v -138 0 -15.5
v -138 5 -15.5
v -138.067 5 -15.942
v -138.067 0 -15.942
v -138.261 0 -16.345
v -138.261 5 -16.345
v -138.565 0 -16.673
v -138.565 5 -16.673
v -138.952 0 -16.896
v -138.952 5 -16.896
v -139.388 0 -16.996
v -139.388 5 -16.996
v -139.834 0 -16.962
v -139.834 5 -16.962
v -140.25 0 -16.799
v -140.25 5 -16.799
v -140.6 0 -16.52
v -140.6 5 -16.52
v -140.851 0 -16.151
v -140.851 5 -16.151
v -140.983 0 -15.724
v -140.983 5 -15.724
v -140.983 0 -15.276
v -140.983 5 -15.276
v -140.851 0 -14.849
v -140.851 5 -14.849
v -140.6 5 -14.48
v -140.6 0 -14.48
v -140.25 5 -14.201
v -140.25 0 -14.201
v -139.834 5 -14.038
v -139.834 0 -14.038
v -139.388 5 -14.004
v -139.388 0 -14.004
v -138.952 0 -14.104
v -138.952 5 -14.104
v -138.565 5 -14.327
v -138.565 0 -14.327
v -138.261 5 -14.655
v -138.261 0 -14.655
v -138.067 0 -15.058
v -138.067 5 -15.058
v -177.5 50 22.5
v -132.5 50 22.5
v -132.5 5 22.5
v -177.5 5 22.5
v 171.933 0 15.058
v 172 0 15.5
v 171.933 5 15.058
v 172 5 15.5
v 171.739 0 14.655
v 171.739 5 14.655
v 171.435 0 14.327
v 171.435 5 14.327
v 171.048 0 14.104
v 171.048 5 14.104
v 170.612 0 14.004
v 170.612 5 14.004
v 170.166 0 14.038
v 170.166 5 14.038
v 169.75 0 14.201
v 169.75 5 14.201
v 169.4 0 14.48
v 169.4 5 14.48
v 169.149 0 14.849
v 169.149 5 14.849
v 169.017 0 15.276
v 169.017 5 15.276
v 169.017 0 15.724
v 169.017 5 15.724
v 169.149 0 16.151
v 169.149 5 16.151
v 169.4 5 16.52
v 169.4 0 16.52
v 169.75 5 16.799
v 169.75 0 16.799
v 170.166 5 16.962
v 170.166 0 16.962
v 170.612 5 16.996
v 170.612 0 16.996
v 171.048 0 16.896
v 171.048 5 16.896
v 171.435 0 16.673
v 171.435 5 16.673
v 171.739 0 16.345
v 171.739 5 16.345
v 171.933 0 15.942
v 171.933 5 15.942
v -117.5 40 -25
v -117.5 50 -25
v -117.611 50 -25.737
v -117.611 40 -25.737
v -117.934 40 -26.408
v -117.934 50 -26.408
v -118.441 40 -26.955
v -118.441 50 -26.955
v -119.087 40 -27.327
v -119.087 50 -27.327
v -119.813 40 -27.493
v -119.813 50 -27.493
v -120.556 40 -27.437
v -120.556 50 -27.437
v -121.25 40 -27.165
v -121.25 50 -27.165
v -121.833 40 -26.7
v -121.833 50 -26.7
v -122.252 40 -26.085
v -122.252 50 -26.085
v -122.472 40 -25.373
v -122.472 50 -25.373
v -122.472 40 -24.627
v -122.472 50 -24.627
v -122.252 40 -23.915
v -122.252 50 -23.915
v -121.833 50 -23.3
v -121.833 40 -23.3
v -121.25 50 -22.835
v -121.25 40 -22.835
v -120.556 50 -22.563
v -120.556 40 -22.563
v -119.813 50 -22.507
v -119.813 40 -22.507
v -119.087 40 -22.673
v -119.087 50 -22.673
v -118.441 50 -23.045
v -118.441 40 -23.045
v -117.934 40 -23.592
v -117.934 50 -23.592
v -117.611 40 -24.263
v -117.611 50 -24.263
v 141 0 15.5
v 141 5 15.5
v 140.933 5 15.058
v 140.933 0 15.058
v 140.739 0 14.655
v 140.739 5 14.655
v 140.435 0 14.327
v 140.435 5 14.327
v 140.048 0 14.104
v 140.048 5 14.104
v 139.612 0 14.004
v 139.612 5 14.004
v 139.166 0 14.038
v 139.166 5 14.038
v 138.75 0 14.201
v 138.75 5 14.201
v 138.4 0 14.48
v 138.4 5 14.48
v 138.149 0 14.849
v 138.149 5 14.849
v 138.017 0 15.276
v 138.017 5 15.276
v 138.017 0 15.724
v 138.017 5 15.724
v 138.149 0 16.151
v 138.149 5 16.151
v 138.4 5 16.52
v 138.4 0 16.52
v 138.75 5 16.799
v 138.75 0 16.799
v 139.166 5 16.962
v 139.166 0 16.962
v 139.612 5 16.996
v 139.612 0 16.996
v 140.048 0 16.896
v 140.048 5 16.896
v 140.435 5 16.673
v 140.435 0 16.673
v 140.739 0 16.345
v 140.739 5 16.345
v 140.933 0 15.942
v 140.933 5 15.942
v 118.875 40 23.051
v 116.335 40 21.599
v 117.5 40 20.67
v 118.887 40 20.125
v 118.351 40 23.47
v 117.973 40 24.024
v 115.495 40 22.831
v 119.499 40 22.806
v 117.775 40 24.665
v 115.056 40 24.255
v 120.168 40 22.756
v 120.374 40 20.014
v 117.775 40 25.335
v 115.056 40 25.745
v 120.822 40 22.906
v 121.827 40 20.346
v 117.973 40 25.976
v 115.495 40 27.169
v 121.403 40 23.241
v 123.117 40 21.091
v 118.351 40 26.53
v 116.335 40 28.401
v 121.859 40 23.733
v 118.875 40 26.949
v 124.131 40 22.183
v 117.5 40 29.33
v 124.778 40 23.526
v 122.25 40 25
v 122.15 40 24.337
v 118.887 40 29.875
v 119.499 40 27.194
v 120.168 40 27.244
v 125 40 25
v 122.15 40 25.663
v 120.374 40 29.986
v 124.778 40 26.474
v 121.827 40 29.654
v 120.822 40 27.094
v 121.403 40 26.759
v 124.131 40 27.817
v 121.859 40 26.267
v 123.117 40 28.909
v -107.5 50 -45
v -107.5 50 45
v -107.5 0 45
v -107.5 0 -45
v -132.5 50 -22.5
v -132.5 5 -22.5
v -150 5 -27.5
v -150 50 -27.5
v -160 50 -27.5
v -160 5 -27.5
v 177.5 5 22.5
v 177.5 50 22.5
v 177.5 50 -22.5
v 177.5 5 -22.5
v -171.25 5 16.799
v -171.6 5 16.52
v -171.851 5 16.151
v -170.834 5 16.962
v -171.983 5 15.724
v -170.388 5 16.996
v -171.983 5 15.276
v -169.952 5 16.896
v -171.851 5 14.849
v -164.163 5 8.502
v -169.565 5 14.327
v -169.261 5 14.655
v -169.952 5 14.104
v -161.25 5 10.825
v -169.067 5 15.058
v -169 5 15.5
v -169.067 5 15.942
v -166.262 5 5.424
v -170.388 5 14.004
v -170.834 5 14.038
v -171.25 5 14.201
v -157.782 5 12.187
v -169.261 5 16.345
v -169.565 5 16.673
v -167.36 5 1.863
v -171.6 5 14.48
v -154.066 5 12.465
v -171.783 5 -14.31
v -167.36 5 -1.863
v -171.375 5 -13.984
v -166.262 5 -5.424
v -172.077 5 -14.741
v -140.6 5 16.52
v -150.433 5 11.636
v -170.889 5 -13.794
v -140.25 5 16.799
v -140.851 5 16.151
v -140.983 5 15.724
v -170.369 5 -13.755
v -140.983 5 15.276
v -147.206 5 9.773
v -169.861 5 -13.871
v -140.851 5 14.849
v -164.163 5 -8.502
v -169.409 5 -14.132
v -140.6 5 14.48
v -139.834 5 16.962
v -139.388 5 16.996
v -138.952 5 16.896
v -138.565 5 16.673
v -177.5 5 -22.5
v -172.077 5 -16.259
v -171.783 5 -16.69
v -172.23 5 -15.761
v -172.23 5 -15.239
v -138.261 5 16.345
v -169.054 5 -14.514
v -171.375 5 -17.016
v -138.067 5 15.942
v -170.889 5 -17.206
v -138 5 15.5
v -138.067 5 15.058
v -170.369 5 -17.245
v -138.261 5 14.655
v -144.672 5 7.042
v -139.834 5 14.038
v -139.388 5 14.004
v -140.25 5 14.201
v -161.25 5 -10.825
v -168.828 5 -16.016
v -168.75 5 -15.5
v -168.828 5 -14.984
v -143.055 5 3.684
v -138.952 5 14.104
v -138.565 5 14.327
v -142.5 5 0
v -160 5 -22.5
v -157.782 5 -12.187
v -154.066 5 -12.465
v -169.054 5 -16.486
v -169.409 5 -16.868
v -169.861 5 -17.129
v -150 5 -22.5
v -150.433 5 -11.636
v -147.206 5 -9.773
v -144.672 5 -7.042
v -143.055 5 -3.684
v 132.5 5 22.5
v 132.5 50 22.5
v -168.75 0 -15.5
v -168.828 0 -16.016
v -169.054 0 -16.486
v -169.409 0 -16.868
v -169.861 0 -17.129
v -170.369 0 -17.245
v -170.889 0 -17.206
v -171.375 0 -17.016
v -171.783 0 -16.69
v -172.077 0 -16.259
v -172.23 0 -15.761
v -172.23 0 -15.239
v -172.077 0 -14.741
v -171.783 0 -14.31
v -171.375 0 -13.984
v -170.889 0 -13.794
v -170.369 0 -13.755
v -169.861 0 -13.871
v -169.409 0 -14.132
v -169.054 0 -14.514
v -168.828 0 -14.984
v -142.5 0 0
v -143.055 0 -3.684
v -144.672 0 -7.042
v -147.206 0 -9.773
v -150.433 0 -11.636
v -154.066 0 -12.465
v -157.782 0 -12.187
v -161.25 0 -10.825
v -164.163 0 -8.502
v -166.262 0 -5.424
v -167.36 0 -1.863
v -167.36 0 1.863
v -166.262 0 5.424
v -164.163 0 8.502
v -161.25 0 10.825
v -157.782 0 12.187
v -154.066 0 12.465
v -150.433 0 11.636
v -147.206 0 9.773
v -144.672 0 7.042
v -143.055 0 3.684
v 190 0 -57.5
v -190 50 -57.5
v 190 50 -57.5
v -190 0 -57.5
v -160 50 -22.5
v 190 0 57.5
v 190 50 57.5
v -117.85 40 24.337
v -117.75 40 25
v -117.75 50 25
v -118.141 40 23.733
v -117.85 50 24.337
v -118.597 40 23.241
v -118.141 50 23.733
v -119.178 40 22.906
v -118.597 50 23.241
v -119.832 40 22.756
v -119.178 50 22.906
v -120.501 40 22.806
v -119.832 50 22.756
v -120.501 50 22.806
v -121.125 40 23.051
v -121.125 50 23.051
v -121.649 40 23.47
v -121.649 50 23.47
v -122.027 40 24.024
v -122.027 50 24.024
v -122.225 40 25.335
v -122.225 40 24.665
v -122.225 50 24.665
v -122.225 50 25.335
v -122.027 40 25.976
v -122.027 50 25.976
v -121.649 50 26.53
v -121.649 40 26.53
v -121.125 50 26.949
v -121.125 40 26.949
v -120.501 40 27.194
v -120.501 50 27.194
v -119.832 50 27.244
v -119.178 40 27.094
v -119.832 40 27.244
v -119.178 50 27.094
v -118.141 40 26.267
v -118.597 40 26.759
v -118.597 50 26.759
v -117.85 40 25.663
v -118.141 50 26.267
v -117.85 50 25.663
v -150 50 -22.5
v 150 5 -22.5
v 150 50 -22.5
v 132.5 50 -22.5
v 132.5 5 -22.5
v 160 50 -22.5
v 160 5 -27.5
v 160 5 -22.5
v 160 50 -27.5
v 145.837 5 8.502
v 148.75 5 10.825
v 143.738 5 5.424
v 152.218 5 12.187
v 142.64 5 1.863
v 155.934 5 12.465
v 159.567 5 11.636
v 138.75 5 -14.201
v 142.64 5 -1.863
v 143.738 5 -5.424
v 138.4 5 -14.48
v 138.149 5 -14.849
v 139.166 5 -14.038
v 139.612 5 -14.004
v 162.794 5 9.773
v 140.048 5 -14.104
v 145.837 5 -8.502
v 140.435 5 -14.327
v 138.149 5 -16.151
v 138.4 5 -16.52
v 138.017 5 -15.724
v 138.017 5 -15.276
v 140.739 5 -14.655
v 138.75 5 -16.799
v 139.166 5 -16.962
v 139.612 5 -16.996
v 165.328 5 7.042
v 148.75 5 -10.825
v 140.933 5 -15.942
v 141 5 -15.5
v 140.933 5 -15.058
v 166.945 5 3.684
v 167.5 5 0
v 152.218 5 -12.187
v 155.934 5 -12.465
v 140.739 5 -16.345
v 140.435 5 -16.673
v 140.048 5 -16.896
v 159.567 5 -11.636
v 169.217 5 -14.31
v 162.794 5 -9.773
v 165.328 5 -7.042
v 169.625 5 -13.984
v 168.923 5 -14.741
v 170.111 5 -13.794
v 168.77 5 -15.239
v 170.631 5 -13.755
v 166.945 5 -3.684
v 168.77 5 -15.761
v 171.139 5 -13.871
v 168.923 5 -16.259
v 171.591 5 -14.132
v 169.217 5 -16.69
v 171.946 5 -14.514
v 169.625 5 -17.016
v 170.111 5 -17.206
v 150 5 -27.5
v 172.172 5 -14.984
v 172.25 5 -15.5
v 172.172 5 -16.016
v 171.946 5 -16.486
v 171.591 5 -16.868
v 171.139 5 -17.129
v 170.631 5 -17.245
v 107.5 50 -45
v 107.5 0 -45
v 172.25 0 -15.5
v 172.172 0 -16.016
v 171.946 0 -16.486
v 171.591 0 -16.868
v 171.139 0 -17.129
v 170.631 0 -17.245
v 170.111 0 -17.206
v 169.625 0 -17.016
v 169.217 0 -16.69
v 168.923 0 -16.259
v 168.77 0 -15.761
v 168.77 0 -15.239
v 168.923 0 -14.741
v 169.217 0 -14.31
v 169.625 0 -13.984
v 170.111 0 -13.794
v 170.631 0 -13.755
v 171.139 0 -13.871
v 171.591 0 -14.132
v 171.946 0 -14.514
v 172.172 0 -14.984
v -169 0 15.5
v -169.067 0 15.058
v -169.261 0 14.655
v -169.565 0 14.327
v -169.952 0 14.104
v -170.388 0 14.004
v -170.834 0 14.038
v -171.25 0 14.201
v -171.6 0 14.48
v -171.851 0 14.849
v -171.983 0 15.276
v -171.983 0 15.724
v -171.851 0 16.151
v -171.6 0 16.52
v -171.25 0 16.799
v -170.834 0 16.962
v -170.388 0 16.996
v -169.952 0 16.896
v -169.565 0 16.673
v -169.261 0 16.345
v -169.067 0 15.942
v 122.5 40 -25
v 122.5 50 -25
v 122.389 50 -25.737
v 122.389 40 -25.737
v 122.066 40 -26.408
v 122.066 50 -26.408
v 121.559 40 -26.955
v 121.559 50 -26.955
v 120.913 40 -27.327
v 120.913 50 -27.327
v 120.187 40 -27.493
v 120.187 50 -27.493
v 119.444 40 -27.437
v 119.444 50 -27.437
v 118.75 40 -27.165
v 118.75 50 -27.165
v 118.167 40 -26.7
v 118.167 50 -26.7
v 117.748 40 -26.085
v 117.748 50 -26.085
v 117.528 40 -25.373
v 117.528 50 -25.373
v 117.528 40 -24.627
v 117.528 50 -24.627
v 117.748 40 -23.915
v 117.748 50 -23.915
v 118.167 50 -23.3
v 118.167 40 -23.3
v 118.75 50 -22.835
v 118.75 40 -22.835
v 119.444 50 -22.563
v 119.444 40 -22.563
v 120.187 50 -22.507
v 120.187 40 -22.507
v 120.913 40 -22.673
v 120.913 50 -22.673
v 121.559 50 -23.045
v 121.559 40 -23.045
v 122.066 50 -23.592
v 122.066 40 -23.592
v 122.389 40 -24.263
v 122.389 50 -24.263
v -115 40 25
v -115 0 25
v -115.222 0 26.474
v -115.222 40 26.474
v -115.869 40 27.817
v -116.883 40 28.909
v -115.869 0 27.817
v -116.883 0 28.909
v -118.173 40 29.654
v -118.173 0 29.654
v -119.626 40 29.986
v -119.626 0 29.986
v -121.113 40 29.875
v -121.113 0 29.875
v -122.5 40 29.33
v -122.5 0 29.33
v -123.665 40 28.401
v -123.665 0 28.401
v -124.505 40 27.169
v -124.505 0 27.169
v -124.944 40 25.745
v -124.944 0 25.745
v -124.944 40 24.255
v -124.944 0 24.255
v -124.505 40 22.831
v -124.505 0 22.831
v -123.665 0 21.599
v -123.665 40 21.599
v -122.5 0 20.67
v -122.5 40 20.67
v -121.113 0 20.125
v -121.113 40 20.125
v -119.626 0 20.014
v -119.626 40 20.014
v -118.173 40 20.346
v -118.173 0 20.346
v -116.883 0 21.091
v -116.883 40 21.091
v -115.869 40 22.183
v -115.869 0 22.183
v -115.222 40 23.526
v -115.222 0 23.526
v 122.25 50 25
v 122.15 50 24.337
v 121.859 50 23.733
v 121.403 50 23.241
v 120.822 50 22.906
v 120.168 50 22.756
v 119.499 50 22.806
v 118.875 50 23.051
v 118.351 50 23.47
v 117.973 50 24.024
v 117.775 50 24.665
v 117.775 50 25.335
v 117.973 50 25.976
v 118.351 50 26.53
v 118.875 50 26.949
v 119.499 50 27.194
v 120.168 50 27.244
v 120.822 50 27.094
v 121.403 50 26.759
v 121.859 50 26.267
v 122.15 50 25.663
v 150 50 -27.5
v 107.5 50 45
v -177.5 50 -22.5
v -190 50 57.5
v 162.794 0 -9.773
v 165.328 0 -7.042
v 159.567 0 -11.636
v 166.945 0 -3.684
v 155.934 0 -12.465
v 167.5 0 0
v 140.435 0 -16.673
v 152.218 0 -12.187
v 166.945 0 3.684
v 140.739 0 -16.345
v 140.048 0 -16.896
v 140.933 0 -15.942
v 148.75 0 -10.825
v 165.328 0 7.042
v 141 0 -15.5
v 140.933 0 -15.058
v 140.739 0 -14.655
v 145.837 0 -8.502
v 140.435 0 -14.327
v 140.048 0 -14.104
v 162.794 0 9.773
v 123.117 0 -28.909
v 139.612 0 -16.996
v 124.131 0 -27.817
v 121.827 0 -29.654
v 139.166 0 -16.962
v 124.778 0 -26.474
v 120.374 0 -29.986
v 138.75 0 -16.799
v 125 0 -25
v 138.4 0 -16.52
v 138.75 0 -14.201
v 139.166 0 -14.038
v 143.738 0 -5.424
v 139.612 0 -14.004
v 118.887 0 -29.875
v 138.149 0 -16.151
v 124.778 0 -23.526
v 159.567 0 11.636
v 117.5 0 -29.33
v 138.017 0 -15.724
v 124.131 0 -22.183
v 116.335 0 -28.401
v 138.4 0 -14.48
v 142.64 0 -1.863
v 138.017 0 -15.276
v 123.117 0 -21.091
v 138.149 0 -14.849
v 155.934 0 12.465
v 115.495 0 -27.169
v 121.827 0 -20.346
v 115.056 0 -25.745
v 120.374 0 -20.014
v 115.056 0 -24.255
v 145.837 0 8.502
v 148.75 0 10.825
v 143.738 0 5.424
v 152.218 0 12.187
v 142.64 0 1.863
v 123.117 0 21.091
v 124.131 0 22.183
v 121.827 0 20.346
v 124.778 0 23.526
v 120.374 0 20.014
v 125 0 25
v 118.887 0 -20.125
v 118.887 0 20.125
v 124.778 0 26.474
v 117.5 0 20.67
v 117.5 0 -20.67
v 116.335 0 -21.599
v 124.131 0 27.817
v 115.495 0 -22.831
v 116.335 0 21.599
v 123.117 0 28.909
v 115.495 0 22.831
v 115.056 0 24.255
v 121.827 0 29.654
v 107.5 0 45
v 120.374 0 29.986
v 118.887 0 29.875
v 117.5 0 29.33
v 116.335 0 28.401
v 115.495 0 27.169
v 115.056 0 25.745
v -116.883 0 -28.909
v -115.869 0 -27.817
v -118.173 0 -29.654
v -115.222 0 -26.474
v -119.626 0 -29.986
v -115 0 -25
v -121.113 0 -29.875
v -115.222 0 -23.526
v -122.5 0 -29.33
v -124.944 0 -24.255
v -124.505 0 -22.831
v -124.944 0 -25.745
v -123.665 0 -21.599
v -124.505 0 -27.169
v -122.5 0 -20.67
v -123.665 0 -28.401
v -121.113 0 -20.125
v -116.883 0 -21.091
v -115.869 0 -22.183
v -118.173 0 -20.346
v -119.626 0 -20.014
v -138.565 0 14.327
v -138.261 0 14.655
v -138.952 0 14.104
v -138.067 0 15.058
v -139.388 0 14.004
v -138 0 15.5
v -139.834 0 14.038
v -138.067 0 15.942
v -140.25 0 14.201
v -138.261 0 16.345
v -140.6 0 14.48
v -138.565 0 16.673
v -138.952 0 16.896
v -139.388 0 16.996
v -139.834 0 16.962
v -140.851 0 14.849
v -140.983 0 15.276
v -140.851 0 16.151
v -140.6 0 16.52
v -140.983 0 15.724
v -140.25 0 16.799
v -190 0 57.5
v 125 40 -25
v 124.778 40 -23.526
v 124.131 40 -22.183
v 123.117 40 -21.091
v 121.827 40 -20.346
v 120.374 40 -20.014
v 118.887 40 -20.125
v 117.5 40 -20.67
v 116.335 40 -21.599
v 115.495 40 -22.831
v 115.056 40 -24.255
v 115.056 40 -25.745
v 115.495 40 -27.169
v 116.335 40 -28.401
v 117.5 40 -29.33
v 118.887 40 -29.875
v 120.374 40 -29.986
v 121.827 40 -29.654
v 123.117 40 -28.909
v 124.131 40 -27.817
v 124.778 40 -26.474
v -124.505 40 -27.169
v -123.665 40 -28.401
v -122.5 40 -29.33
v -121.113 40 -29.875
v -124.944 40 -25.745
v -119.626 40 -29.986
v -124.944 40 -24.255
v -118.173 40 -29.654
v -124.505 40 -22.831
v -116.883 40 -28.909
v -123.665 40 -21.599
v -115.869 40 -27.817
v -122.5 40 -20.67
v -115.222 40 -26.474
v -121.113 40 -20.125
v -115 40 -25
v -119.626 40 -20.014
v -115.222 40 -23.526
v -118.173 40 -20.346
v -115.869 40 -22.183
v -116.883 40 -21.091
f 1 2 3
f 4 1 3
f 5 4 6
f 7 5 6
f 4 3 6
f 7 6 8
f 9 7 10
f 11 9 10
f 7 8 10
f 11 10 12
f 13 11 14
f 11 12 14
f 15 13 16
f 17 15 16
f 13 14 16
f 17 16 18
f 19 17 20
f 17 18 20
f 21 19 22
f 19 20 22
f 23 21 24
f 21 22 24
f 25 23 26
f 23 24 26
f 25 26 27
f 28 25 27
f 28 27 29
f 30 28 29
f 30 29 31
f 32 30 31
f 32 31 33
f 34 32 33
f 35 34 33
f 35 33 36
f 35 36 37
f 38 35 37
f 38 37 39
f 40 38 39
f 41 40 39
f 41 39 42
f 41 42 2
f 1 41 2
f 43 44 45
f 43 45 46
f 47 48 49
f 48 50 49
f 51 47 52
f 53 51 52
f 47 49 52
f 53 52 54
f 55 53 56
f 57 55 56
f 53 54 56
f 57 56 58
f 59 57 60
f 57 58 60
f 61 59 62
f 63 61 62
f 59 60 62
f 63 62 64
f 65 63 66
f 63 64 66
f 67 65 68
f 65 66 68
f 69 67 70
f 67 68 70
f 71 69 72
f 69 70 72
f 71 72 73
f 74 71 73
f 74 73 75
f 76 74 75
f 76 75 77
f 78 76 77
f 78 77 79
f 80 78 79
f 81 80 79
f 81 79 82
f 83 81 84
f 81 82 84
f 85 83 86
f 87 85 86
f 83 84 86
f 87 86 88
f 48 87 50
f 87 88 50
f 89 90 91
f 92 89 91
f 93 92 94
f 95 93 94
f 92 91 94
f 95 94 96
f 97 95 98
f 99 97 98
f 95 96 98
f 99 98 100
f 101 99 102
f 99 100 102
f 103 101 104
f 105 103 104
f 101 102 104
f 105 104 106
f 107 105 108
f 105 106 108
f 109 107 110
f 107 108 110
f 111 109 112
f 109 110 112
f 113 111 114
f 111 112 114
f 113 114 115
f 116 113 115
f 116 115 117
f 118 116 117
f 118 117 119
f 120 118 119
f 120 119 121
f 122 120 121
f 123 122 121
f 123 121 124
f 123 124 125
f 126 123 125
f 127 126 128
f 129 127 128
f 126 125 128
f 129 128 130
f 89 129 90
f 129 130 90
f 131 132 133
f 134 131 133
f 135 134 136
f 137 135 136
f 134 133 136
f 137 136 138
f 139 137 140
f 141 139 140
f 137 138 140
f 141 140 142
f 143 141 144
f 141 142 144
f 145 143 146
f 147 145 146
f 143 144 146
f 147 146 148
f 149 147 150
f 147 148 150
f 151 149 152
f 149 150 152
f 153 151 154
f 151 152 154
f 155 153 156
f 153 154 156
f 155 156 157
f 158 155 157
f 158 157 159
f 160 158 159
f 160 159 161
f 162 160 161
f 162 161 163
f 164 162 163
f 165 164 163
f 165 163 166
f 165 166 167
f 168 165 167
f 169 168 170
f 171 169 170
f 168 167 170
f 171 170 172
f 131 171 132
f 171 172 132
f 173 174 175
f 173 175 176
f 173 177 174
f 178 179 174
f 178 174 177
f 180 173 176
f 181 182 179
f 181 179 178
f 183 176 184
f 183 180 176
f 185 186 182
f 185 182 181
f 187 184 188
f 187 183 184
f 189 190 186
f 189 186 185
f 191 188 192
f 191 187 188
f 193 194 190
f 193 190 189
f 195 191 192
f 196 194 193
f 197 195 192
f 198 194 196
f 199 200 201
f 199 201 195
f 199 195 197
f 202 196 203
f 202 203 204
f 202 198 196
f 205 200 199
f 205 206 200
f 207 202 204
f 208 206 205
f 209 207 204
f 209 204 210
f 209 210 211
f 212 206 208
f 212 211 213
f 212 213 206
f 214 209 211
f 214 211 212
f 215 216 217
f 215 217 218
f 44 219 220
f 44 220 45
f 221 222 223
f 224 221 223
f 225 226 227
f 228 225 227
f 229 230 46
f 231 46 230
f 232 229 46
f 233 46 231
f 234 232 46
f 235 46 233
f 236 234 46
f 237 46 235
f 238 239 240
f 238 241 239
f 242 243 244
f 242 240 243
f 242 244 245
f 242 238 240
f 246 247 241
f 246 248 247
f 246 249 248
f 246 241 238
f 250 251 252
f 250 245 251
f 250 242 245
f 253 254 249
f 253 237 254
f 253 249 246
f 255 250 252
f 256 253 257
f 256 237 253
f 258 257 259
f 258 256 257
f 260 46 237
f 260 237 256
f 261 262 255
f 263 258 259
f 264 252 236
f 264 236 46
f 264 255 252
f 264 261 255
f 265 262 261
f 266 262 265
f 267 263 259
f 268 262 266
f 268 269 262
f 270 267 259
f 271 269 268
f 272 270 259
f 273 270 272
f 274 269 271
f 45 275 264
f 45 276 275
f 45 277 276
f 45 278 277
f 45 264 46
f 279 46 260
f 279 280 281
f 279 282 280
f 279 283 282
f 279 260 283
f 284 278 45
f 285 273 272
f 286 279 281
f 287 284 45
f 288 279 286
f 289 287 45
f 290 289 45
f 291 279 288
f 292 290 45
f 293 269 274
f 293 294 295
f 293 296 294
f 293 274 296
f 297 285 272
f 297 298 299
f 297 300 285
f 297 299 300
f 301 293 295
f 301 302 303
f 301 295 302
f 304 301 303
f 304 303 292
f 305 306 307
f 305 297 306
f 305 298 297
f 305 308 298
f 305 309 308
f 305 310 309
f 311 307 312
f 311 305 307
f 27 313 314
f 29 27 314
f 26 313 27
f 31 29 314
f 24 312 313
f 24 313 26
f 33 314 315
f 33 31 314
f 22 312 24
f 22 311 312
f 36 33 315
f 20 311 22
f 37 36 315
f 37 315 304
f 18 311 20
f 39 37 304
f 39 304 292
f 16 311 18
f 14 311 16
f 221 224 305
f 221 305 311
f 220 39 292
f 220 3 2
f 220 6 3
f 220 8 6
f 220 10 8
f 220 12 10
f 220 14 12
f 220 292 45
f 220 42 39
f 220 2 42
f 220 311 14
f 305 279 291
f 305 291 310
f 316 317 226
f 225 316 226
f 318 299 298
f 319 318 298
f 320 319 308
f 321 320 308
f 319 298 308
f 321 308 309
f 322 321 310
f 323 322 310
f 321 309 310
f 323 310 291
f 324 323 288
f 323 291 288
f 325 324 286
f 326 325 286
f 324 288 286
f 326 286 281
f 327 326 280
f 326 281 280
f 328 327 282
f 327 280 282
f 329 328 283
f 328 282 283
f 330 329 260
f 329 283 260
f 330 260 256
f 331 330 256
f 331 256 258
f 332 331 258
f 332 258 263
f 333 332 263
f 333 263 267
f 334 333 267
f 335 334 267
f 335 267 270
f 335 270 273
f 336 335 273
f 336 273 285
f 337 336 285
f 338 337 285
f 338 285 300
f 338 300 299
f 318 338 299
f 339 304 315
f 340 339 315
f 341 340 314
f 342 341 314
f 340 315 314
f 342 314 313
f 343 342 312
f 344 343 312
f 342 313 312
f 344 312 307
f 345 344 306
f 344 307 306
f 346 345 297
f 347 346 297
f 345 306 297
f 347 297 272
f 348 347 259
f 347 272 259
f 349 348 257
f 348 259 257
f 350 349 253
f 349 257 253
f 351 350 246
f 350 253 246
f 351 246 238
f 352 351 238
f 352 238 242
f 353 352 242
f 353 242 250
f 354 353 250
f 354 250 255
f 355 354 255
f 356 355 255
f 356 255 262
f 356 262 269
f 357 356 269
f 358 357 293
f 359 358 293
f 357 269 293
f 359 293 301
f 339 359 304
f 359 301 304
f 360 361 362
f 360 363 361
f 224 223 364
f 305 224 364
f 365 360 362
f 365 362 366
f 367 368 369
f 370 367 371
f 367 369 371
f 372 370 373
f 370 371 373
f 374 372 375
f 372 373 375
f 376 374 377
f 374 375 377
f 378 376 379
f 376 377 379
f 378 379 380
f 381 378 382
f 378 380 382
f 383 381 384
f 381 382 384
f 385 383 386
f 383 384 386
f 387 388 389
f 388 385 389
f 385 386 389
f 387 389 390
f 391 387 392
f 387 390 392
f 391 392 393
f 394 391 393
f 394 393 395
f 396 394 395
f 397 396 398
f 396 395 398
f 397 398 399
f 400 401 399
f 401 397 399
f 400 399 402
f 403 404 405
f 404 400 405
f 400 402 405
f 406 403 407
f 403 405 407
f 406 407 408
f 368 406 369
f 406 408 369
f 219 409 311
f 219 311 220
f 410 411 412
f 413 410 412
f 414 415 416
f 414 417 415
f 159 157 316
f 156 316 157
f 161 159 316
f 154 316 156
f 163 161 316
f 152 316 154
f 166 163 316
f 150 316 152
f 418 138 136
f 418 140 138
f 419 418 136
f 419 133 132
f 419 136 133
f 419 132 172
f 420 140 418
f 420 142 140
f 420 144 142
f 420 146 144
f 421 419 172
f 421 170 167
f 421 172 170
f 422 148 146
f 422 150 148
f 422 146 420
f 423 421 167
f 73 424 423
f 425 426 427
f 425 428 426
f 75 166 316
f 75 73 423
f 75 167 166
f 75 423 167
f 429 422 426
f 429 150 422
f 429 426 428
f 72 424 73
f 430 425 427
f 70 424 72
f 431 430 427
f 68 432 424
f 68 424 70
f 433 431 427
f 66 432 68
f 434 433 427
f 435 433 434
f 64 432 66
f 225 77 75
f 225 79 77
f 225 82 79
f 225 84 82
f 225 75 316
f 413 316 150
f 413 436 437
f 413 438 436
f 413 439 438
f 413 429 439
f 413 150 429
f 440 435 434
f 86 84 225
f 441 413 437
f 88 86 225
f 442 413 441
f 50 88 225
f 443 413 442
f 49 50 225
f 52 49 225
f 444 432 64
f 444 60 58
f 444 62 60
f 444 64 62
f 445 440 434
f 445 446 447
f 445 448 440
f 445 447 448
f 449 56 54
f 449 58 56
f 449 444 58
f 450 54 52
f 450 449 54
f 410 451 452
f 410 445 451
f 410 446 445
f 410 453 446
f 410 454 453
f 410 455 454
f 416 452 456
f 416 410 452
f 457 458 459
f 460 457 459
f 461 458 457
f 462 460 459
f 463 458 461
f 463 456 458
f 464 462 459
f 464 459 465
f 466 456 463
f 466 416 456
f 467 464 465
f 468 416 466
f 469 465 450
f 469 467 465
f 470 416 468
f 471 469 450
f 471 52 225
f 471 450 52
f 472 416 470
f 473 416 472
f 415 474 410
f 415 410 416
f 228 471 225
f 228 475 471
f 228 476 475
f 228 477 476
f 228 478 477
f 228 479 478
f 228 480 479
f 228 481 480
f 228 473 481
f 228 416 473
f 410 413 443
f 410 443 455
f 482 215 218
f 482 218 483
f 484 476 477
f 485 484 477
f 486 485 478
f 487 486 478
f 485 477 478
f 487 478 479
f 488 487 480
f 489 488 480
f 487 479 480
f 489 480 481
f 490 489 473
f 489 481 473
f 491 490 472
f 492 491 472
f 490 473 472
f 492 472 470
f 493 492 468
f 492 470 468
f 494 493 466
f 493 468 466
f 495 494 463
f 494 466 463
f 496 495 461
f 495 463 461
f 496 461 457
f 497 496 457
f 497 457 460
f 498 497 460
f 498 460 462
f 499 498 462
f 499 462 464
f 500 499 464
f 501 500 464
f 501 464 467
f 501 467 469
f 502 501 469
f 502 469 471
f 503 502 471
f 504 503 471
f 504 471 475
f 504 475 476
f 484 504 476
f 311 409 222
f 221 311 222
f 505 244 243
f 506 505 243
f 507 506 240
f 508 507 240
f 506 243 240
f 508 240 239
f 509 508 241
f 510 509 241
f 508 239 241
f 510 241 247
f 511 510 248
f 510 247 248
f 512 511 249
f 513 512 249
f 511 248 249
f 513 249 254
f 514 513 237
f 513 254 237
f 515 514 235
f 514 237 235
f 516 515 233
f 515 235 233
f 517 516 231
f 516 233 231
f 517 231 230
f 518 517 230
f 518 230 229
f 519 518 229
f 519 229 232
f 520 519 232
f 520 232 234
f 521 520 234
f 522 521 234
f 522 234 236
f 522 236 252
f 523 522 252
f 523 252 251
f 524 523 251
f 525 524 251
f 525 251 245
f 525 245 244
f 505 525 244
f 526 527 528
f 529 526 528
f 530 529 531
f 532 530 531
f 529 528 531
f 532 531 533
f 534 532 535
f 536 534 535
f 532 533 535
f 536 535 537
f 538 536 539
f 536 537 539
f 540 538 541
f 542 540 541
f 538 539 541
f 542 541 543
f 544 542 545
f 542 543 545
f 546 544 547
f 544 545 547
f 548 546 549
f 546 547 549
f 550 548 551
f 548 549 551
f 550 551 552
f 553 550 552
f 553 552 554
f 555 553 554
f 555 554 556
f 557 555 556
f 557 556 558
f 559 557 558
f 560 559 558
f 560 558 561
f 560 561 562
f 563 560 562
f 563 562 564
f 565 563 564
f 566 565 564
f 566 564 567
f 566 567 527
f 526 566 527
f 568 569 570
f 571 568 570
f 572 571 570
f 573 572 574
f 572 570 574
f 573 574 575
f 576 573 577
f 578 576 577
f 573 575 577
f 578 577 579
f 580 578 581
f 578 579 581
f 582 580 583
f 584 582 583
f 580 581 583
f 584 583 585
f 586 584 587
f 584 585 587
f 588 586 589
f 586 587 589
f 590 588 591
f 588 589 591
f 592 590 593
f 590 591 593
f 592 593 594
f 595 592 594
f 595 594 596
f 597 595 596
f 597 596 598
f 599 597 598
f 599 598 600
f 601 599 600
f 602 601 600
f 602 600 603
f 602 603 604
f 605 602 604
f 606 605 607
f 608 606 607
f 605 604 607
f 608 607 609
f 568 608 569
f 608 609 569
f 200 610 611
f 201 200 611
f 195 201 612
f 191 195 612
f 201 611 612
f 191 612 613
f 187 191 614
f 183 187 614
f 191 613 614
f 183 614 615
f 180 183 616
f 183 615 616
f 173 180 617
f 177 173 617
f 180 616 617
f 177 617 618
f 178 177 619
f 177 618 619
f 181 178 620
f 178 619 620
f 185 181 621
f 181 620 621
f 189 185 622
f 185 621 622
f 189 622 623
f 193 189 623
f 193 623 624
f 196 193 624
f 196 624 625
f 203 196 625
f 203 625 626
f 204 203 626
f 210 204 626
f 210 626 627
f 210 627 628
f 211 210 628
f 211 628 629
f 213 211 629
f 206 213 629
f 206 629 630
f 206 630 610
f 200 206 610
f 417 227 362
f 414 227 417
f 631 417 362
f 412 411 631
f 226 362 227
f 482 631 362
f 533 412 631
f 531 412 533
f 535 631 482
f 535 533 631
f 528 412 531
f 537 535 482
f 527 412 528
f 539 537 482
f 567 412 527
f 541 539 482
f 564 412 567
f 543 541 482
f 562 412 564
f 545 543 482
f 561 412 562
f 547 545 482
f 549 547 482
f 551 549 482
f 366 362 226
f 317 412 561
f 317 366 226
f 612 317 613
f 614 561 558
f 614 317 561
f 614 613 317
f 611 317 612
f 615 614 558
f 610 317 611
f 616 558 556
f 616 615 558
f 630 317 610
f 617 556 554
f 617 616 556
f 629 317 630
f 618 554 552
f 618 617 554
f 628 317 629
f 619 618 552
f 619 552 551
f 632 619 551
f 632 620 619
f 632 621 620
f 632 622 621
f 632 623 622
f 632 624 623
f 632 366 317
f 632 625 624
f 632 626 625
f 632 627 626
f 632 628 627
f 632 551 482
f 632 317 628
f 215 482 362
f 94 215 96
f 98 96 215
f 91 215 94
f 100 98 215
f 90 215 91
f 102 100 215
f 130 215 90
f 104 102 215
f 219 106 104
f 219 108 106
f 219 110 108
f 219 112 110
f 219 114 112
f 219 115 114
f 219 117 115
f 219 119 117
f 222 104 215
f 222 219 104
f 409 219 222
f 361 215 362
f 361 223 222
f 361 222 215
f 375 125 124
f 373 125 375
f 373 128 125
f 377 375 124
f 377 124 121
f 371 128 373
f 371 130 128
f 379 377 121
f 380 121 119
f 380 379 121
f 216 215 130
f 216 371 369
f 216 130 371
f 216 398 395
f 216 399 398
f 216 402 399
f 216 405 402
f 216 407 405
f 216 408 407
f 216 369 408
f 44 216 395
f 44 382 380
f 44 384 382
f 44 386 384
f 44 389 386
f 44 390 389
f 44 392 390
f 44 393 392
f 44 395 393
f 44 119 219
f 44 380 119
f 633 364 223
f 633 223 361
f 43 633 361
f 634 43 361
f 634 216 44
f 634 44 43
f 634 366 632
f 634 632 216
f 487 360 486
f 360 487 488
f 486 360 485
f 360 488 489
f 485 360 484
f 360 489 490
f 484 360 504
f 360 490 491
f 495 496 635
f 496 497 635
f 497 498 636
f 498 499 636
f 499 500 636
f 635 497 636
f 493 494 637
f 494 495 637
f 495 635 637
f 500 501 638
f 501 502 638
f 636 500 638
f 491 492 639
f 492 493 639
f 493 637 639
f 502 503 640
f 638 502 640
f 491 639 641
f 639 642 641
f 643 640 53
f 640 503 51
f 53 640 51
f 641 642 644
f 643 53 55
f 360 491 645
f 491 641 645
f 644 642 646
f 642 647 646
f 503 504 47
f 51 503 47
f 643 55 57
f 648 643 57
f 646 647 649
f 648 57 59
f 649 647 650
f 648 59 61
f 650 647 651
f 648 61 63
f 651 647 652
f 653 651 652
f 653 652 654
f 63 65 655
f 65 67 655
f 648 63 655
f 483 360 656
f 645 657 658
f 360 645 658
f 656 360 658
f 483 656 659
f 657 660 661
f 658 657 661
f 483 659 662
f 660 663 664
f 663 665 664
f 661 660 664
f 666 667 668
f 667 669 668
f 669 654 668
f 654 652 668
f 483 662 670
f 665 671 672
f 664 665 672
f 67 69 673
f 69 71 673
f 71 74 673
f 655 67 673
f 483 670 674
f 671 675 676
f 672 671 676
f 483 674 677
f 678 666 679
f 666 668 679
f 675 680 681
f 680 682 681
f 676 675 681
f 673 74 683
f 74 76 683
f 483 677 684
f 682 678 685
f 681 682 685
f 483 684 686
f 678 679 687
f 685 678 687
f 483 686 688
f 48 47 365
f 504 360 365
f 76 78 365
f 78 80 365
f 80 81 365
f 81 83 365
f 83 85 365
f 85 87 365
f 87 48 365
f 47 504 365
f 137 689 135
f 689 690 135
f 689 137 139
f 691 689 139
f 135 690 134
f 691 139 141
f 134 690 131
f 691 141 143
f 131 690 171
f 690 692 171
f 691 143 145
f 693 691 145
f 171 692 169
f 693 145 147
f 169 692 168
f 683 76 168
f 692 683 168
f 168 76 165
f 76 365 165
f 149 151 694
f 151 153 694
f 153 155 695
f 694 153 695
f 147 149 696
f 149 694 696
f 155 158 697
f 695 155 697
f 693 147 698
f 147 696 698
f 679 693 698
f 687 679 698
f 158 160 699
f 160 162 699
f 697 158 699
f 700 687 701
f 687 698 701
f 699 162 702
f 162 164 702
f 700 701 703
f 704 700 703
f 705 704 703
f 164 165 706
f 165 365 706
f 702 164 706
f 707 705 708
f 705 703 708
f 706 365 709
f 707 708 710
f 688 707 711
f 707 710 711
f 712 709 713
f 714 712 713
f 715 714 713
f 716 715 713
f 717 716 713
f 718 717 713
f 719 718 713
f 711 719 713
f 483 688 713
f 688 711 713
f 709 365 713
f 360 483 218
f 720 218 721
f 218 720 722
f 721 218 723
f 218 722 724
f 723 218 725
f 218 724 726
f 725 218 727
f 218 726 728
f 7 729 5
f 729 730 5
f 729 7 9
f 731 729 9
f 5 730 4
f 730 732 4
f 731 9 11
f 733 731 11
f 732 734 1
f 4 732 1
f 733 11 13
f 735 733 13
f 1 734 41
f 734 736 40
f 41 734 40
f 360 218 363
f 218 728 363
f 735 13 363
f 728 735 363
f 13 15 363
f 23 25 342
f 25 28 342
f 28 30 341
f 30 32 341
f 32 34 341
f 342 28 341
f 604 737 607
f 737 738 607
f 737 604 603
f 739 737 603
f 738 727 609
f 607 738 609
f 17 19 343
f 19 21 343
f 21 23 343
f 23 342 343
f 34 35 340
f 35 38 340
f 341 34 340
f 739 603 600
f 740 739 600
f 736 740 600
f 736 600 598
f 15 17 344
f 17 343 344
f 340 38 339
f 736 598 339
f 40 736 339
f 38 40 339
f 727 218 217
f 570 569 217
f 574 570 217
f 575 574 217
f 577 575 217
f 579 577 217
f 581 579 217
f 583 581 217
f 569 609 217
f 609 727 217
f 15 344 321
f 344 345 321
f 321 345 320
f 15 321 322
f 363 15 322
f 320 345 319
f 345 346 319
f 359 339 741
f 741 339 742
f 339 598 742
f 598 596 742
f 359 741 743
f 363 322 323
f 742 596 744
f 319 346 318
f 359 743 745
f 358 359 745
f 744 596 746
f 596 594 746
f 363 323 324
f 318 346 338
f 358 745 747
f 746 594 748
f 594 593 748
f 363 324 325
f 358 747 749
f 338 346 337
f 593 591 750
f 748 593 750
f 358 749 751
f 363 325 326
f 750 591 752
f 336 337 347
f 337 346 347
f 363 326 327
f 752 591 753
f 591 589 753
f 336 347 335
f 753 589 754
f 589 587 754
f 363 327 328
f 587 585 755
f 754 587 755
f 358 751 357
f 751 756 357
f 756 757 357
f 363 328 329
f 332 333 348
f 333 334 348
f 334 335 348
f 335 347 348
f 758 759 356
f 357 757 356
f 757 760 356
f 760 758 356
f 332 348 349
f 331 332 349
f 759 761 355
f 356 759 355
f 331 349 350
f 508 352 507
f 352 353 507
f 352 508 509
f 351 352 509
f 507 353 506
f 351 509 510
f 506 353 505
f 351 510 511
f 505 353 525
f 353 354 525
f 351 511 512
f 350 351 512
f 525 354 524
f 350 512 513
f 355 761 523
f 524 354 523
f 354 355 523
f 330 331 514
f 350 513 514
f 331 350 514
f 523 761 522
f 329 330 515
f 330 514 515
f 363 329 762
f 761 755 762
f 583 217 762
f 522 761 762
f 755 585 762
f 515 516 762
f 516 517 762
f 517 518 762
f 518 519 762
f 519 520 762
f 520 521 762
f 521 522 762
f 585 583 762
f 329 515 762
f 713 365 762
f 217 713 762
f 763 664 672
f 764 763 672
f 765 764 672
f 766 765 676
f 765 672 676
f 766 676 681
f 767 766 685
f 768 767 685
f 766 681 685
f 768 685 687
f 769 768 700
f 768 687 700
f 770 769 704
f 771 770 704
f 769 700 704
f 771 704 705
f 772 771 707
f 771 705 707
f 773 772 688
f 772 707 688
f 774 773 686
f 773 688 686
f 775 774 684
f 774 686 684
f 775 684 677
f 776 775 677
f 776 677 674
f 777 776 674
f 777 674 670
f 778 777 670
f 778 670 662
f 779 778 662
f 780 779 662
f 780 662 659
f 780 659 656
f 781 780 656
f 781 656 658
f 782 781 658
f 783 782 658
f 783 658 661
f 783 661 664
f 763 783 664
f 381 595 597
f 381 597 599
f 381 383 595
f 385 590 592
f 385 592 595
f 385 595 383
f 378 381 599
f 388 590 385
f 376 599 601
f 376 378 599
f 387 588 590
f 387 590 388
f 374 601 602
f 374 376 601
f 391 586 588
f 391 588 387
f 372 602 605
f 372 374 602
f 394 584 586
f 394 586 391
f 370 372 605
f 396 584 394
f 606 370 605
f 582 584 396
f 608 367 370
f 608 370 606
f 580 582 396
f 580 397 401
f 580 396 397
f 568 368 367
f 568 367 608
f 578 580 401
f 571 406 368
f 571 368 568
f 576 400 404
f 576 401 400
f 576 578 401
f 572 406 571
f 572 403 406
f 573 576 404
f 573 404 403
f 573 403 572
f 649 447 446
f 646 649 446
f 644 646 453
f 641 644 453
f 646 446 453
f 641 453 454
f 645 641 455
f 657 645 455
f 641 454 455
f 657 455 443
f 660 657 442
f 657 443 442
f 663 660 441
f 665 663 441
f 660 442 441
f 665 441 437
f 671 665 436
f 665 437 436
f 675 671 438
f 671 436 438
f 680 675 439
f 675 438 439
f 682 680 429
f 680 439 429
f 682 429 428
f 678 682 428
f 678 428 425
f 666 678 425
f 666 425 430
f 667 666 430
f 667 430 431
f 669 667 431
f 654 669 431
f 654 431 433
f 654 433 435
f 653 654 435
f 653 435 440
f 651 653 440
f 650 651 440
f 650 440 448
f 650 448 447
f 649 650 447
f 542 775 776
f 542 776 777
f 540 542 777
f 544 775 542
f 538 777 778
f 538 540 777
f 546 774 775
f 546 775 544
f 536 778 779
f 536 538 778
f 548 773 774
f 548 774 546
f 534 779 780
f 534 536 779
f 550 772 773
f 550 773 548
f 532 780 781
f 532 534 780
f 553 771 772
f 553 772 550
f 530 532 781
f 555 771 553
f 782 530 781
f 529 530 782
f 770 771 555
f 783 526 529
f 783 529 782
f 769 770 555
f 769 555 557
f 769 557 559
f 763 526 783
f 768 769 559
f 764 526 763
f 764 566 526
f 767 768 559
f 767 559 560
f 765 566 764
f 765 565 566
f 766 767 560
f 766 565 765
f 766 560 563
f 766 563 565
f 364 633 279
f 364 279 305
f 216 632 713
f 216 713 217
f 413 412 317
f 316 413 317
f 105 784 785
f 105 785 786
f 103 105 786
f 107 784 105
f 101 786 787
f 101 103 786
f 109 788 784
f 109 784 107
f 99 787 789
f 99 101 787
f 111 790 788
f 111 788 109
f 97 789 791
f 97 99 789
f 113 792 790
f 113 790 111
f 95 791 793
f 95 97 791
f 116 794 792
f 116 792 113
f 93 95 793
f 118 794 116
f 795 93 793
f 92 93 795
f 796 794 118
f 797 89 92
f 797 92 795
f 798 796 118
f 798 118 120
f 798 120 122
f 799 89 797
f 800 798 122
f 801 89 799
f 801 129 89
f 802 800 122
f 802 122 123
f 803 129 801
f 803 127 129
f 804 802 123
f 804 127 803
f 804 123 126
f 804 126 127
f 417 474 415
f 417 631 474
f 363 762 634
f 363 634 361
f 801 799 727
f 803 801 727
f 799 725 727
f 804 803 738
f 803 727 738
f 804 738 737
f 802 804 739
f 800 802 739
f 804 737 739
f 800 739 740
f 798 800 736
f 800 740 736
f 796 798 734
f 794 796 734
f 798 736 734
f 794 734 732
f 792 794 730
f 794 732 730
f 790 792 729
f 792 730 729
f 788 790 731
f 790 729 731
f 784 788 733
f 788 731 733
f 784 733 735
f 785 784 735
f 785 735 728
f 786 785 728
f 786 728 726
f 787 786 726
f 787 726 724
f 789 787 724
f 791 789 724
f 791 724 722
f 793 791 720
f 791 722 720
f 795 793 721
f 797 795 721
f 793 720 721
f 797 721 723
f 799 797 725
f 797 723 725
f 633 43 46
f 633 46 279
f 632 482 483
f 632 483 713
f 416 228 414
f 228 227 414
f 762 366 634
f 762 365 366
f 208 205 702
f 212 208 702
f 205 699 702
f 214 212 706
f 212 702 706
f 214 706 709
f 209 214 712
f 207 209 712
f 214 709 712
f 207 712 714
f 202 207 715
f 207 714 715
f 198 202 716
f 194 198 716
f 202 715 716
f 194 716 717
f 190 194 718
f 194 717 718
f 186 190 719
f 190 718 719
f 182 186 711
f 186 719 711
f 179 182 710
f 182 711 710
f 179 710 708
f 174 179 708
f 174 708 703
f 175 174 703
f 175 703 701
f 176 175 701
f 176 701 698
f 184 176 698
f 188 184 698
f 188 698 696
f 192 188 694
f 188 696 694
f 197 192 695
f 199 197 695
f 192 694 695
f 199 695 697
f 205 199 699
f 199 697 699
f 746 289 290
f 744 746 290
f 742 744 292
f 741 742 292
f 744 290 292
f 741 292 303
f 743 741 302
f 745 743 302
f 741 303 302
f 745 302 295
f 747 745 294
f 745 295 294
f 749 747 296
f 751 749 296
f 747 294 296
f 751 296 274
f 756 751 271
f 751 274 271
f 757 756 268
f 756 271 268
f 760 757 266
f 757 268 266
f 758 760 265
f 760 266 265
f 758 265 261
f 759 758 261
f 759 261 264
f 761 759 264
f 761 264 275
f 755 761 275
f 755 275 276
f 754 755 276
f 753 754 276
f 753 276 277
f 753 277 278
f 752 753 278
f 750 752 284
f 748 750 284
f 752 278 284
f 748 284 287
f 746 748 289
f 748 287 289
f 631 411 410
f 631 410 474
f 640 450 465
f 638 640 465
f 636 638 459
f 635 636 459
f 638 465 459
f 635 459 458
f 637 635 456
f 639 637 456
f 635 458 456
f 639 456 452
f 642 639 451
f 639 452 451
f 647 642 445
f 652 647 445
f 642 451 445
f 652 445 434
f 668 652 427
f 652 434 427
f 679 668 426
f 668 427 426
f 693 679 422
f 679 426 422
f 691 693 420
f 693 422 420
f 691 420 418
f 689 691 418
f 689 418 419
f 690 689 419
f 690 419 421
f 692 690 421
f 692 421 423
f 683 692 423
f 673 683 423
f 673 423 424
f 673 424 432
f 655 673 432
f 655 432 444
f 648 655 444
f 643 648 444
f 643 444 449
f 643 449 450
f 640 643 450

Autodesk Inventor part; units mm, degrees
ref_plane "YZ Plane" through (0, 0, 0) normal (1, 0, 0) x (0, 1, 0)
ref_plane "XZ Plane" through (0, 0, 0) normal (0, 1, 0) x (-1, 0, 0)
ref_plane "XY Plane" through (0, 0, 0) normal (0, 0, 1) x (1, 0, 0)
sketch "Sketch1" plane through (0, 0, 0) normal (0, 1, 0) x (-1, 0, 0)
  line L0 (190, -57.5) -> (-190, -57.5)
  line L1 (-190, -57.5) -> (-190, 57.5)
  line L2 (-190, 57.5) -> (190, 57.5)
  line L3 (190, 57.5) -> (190, -57.5)
  line L4 (0, -57.5) -> (0, 57.5) construction
  line L5 (190, 0) -> (-190, 0) construction
  point P0 (0, 0)
  point P1 (0, 0)
  dimension "d0" = 380
  dimension "d1" = 115
extrude "Extrusion1" add sketch "Sketch1" along normal blind 50
sketch "Sketch2" plane through (0, 50, 0) normal (0, 1, 0) x (1, 0, 0)
  line L0 (-177.5, 22.5) -> (-132.5, 22.5)
  line L1 (-132.5, 22.5) -> (-132.5, -22.5)
  line L2 (-132.5, -22.5) -> (-177.5, -22.5)
  line L3 (-177.5, -22.5) -> (-177.5, 22.5)
  line L4 (190, 57.5) -> (-190, 57.5) construction
  line L5 (0, 57.5) -> (0, -57.5) construction
  line L6 (-190, -57.5) -> (190, -57.5) construction
  line L7 (-190, 57.5) -> (-190, -57.5) construction
  line L8 (-190, 0) -> (190, 0) construction
  line L9 (190, -57.5) -> (190, 57.5) construction
  line L10 (-177.5, 0) -> (-132.5, 0) construction
  line L11 (-155, 22.5) -> (-155, -22.5) construction
  line L12 (177.5, 22.5) -> (132.5, 22.5)
  line L13 (132.5, 22.5) -> (132.5, -22.5)
  line L14 (132.5, -22.5) -> (177.5, -22.5)
  line L15 (177.5, -22.5) -> (177.5, 22.5)
  point P0 (0, 0)
  dimension "d4" = 45
  dimension "d5" = 45
  dimension "d6" = 310
extrude "Extrusion2" cut sketch "Sketch2" against normal blind 45
sketch "Sketch3" plane through (0, 50, 0) normal (0, 1, 0) x (1, 0, 0)
  line L0 (190, 57.5) -> (-190, 57.5) construction
  line L1 (0, 57.5) -> (0, -57.5) construction
  line L2 (-190, -57.5) -> (190, -57.5) construction
  line L3 (-132.5, 22.5) -> (-132.5, -22.5) construction
  line L4 (-132.5, 0) -> (132.5, 0) construction
  line L5 (132.5, -22.5) -> (132.5, 22.5) construction
  line L6 (-120, 25) -> (-120, -25) construction
  circle A0 centre (-120, 25) radius 2.5
  circle A1 centre (-120, -25) radius 2.25
  circle A2 centre (120, 25) radius 2.5
  circle A3 centre (120, -25) radius 2.25
  point P0 (0, 0)
  dimension "d15" = 50
  dimension "d16" = 5
  dimension "d17" = 4.5
  dimension "d18" = 50
  dimension "d19" = 240
extrude "Extrusion3" cut sketch "Sketch3" against normal up to next
sketch "Sketch4" plane through (0, 50, 0) normal (0, 1, 0) x (1, 0, 0)
  line L0 (107.5, -45) -> (-107.5, -45)
  line L1 (-107.5, -45) -> (-107.5, 45)
  line L2 (-107.5, 45) -> (107.5, 45)
  line L3 (107.5, 45) -> (107.5, -45)
  line L4 (0, -45) -> (0, 45) construction
  line L5 (107.5, 0) -> (-107.5, 0) construction
  circle A0 centre (120, -25) radius 2.25 projected
  point P0 (0, 0)
  point P1 (0, 0)
  dimension "d23" = 90
  dimension "d29" = 12.5
extrude "Extrusion4" cut sketch "Sketch4" against normal up to next contours L0 L1 L2 L3
sketch "Sketch5" plane through (0, 5, 0) normal (0, 1, 0) x (1, 0, 0)
  line L0 (-190, -57.5) -> (190, -57.5) construction
  line L1 (0, -57.5) -> (0, 57.5) construction
  line L2 (190, 57.5) -> (-190, 57.5) construction
  line L3 (132.5, -22.5) -> (132.5, 22.5) construction
  line L4 (177.5, -22.5) -> (132.5, -22.5) construction
  line L5 (177.5, 22.5) -> (177.5, -22.5) construction
  line L6 (132.5, 22.5) -> (177.5, 22.5) construction
  line L7 (177.5, -22.5) -> (132.5, -22.5) construction
  line L8 (155, -22.5) -> (155, 22.5) construction
  line L9 (132.5, 22.5) -> (177.5, 22.5) construction
  line L10 (177.5, 22.5) -> (177.5, -22.5) construction
  line L11 (177.5, 0) -> (132.5, 0) construction
  line L12 (132.5, -22.5) -> (132.5, 22.5) construction
  circle A0 centre (155, 0) radius 12.5
  circle A1 centre (-155, 0) radius 12.5
  point P0 (0, 0)
  dimension "d26" = 25
extrude "Extrusion5" cut sketch "Sketch5" against normal up to next
sketch "Sketch6" plane through (0, 5, 0) normal (0, 1, 0) x (1, 0, 0)
  line L0 (190, 57.5) -> (-190, 57.5) construction
  line L1 (0, 57.5) -> (0, -57.5) construction
  line L2 (190, -57.5) -> (-190, -57.5) construction
  line L3 (-170.5, 15.5) -> (-139.5, 15.5) construction
  line L4 (-139.5, 15.5) -> (-139.5, -15.5) construction
  line L5 (-139.5, -15.5) -> (-170.5, -15.5) construction
  line L6 (-170.5, -15.5) -> (-170.5, 15.5) construction
  line L7 (-177.5, 22.5) -> (-132.5, 22.5) construction
  line L8 (-132.5, -22.5) -> (-177.5, -22.5) construction
  line L9 (-155, 22.5) -> (-155, -22.5) construction
  line L10 (-177.5, -22.5) -> (-177.5, 22.5) construction
  line L11 (-177.5, 0) -> (-132.5, 0) construction
  line L12 (-132.5, 22.5) -> (-132.5, -22.5) construction
  line L13 (-170.5, 0) -> (-139.5, 0) construction
  line L14 (-155, -15.5) -> (-155, 15.5) construction
  circle A0 centre (-170.5, 15.5) radius 1.75
  circle A1 centre (-139.5, 15.5) radius 1.5
  circle A2 centre (-170.5, -15.5) radius 1.5
  circle A3 centre (-139.5, -15.5) radius 1.5
  circle A4 centre (170.5, 15.5) radius 1.75
  circle A5 centre (139.5, 15.5) radius 1.5
  circle A6 centre (170.5, -15.5) radius 1.5
  circle A7 centre (139.5, -15.5) radius 1.5
  point P0 (0, 0)
  point P1 (-155, 0)
  dimension "d30" = 31
  dimension "d31" = 31
  dimension "d32" = 3.5
  dimension "d33" = 3
  dimension "d34" = 3
  dimension "d35" = 3
extrude "Extrusion6" cut sketch "Sketch6" against normal up to next
sketch "Sketch7" plane through (0, 50, 0) normal (0, 1, 0) x (1, 0, 0)
  line L0 (-190, 57.5) -> (190, 57.5) construction
  line L1 (0, 57.5) -> (0, -57.5) construction
  line L2 (190, -57.5) -> (-190, -57.5) construction
  line L3 (-177.5, 22.5) -> (-132.5, 22.5) projected
  line L4 (-160, 22.5) -> (-150, 22.5)
  line L5 (-150, 22.5) -> (-150, 27.5)
  line L6 (-150, 27.5) -> (-160, 27.5)
  line L7 (-160, 27.5) -> (-160, 22.5)
  line L8 (-155, 27.5) -> (-155, 22.5) construction
  line L9 (160, 22.5) -> (150, 22.5)
  line L10 (150, 22.5) -> (150, 27.5)
  line L11 (150, 27.5) -> (160, 27.5)
  line L12 (160, 27.5) -> (160, 22.5)
  point P0 (0, 0)
  dimension "d38" = 10
  dimension "d39" = 5
  dimension "d40" = 22.5
extrude "Extrusion7" cut sketch "Sketch7" against normal blind 45
sketch "Sketch8" plane through (0, 0, 0) normal (0, -1, 0) x (1, 0, 0)
  circle A0 centre (-120, 25) radius 2.25 projected
  circle A1 centre (-120, 25) radius 5
  line L0 (-190, -57.5) -> (-190, 57.5) construction
  line L1 (-190, 0) -> (190, 0) construction
  line L2 (190, 57.5) -> (190, -57.5) construction
  line L3 (-190, -57.5) -> (190, -57.5) construction
  line L4 (0, -57.5) -> (0, 57.5) construction
  line L5 (190, 57.5) -> (-190, 57.5) construction
  circle A2 centre (-120, -25) radius 5
  circle A3 centre (120, 25) radius 5
  circle A4 centre (120, -25) radius 5
  point P0 (0, 0)
  dimension "d43" = 10
extrude "Extrusion8" cut sketch "Sketch8" against normal blind 40
properties part number "antennae_holder"
